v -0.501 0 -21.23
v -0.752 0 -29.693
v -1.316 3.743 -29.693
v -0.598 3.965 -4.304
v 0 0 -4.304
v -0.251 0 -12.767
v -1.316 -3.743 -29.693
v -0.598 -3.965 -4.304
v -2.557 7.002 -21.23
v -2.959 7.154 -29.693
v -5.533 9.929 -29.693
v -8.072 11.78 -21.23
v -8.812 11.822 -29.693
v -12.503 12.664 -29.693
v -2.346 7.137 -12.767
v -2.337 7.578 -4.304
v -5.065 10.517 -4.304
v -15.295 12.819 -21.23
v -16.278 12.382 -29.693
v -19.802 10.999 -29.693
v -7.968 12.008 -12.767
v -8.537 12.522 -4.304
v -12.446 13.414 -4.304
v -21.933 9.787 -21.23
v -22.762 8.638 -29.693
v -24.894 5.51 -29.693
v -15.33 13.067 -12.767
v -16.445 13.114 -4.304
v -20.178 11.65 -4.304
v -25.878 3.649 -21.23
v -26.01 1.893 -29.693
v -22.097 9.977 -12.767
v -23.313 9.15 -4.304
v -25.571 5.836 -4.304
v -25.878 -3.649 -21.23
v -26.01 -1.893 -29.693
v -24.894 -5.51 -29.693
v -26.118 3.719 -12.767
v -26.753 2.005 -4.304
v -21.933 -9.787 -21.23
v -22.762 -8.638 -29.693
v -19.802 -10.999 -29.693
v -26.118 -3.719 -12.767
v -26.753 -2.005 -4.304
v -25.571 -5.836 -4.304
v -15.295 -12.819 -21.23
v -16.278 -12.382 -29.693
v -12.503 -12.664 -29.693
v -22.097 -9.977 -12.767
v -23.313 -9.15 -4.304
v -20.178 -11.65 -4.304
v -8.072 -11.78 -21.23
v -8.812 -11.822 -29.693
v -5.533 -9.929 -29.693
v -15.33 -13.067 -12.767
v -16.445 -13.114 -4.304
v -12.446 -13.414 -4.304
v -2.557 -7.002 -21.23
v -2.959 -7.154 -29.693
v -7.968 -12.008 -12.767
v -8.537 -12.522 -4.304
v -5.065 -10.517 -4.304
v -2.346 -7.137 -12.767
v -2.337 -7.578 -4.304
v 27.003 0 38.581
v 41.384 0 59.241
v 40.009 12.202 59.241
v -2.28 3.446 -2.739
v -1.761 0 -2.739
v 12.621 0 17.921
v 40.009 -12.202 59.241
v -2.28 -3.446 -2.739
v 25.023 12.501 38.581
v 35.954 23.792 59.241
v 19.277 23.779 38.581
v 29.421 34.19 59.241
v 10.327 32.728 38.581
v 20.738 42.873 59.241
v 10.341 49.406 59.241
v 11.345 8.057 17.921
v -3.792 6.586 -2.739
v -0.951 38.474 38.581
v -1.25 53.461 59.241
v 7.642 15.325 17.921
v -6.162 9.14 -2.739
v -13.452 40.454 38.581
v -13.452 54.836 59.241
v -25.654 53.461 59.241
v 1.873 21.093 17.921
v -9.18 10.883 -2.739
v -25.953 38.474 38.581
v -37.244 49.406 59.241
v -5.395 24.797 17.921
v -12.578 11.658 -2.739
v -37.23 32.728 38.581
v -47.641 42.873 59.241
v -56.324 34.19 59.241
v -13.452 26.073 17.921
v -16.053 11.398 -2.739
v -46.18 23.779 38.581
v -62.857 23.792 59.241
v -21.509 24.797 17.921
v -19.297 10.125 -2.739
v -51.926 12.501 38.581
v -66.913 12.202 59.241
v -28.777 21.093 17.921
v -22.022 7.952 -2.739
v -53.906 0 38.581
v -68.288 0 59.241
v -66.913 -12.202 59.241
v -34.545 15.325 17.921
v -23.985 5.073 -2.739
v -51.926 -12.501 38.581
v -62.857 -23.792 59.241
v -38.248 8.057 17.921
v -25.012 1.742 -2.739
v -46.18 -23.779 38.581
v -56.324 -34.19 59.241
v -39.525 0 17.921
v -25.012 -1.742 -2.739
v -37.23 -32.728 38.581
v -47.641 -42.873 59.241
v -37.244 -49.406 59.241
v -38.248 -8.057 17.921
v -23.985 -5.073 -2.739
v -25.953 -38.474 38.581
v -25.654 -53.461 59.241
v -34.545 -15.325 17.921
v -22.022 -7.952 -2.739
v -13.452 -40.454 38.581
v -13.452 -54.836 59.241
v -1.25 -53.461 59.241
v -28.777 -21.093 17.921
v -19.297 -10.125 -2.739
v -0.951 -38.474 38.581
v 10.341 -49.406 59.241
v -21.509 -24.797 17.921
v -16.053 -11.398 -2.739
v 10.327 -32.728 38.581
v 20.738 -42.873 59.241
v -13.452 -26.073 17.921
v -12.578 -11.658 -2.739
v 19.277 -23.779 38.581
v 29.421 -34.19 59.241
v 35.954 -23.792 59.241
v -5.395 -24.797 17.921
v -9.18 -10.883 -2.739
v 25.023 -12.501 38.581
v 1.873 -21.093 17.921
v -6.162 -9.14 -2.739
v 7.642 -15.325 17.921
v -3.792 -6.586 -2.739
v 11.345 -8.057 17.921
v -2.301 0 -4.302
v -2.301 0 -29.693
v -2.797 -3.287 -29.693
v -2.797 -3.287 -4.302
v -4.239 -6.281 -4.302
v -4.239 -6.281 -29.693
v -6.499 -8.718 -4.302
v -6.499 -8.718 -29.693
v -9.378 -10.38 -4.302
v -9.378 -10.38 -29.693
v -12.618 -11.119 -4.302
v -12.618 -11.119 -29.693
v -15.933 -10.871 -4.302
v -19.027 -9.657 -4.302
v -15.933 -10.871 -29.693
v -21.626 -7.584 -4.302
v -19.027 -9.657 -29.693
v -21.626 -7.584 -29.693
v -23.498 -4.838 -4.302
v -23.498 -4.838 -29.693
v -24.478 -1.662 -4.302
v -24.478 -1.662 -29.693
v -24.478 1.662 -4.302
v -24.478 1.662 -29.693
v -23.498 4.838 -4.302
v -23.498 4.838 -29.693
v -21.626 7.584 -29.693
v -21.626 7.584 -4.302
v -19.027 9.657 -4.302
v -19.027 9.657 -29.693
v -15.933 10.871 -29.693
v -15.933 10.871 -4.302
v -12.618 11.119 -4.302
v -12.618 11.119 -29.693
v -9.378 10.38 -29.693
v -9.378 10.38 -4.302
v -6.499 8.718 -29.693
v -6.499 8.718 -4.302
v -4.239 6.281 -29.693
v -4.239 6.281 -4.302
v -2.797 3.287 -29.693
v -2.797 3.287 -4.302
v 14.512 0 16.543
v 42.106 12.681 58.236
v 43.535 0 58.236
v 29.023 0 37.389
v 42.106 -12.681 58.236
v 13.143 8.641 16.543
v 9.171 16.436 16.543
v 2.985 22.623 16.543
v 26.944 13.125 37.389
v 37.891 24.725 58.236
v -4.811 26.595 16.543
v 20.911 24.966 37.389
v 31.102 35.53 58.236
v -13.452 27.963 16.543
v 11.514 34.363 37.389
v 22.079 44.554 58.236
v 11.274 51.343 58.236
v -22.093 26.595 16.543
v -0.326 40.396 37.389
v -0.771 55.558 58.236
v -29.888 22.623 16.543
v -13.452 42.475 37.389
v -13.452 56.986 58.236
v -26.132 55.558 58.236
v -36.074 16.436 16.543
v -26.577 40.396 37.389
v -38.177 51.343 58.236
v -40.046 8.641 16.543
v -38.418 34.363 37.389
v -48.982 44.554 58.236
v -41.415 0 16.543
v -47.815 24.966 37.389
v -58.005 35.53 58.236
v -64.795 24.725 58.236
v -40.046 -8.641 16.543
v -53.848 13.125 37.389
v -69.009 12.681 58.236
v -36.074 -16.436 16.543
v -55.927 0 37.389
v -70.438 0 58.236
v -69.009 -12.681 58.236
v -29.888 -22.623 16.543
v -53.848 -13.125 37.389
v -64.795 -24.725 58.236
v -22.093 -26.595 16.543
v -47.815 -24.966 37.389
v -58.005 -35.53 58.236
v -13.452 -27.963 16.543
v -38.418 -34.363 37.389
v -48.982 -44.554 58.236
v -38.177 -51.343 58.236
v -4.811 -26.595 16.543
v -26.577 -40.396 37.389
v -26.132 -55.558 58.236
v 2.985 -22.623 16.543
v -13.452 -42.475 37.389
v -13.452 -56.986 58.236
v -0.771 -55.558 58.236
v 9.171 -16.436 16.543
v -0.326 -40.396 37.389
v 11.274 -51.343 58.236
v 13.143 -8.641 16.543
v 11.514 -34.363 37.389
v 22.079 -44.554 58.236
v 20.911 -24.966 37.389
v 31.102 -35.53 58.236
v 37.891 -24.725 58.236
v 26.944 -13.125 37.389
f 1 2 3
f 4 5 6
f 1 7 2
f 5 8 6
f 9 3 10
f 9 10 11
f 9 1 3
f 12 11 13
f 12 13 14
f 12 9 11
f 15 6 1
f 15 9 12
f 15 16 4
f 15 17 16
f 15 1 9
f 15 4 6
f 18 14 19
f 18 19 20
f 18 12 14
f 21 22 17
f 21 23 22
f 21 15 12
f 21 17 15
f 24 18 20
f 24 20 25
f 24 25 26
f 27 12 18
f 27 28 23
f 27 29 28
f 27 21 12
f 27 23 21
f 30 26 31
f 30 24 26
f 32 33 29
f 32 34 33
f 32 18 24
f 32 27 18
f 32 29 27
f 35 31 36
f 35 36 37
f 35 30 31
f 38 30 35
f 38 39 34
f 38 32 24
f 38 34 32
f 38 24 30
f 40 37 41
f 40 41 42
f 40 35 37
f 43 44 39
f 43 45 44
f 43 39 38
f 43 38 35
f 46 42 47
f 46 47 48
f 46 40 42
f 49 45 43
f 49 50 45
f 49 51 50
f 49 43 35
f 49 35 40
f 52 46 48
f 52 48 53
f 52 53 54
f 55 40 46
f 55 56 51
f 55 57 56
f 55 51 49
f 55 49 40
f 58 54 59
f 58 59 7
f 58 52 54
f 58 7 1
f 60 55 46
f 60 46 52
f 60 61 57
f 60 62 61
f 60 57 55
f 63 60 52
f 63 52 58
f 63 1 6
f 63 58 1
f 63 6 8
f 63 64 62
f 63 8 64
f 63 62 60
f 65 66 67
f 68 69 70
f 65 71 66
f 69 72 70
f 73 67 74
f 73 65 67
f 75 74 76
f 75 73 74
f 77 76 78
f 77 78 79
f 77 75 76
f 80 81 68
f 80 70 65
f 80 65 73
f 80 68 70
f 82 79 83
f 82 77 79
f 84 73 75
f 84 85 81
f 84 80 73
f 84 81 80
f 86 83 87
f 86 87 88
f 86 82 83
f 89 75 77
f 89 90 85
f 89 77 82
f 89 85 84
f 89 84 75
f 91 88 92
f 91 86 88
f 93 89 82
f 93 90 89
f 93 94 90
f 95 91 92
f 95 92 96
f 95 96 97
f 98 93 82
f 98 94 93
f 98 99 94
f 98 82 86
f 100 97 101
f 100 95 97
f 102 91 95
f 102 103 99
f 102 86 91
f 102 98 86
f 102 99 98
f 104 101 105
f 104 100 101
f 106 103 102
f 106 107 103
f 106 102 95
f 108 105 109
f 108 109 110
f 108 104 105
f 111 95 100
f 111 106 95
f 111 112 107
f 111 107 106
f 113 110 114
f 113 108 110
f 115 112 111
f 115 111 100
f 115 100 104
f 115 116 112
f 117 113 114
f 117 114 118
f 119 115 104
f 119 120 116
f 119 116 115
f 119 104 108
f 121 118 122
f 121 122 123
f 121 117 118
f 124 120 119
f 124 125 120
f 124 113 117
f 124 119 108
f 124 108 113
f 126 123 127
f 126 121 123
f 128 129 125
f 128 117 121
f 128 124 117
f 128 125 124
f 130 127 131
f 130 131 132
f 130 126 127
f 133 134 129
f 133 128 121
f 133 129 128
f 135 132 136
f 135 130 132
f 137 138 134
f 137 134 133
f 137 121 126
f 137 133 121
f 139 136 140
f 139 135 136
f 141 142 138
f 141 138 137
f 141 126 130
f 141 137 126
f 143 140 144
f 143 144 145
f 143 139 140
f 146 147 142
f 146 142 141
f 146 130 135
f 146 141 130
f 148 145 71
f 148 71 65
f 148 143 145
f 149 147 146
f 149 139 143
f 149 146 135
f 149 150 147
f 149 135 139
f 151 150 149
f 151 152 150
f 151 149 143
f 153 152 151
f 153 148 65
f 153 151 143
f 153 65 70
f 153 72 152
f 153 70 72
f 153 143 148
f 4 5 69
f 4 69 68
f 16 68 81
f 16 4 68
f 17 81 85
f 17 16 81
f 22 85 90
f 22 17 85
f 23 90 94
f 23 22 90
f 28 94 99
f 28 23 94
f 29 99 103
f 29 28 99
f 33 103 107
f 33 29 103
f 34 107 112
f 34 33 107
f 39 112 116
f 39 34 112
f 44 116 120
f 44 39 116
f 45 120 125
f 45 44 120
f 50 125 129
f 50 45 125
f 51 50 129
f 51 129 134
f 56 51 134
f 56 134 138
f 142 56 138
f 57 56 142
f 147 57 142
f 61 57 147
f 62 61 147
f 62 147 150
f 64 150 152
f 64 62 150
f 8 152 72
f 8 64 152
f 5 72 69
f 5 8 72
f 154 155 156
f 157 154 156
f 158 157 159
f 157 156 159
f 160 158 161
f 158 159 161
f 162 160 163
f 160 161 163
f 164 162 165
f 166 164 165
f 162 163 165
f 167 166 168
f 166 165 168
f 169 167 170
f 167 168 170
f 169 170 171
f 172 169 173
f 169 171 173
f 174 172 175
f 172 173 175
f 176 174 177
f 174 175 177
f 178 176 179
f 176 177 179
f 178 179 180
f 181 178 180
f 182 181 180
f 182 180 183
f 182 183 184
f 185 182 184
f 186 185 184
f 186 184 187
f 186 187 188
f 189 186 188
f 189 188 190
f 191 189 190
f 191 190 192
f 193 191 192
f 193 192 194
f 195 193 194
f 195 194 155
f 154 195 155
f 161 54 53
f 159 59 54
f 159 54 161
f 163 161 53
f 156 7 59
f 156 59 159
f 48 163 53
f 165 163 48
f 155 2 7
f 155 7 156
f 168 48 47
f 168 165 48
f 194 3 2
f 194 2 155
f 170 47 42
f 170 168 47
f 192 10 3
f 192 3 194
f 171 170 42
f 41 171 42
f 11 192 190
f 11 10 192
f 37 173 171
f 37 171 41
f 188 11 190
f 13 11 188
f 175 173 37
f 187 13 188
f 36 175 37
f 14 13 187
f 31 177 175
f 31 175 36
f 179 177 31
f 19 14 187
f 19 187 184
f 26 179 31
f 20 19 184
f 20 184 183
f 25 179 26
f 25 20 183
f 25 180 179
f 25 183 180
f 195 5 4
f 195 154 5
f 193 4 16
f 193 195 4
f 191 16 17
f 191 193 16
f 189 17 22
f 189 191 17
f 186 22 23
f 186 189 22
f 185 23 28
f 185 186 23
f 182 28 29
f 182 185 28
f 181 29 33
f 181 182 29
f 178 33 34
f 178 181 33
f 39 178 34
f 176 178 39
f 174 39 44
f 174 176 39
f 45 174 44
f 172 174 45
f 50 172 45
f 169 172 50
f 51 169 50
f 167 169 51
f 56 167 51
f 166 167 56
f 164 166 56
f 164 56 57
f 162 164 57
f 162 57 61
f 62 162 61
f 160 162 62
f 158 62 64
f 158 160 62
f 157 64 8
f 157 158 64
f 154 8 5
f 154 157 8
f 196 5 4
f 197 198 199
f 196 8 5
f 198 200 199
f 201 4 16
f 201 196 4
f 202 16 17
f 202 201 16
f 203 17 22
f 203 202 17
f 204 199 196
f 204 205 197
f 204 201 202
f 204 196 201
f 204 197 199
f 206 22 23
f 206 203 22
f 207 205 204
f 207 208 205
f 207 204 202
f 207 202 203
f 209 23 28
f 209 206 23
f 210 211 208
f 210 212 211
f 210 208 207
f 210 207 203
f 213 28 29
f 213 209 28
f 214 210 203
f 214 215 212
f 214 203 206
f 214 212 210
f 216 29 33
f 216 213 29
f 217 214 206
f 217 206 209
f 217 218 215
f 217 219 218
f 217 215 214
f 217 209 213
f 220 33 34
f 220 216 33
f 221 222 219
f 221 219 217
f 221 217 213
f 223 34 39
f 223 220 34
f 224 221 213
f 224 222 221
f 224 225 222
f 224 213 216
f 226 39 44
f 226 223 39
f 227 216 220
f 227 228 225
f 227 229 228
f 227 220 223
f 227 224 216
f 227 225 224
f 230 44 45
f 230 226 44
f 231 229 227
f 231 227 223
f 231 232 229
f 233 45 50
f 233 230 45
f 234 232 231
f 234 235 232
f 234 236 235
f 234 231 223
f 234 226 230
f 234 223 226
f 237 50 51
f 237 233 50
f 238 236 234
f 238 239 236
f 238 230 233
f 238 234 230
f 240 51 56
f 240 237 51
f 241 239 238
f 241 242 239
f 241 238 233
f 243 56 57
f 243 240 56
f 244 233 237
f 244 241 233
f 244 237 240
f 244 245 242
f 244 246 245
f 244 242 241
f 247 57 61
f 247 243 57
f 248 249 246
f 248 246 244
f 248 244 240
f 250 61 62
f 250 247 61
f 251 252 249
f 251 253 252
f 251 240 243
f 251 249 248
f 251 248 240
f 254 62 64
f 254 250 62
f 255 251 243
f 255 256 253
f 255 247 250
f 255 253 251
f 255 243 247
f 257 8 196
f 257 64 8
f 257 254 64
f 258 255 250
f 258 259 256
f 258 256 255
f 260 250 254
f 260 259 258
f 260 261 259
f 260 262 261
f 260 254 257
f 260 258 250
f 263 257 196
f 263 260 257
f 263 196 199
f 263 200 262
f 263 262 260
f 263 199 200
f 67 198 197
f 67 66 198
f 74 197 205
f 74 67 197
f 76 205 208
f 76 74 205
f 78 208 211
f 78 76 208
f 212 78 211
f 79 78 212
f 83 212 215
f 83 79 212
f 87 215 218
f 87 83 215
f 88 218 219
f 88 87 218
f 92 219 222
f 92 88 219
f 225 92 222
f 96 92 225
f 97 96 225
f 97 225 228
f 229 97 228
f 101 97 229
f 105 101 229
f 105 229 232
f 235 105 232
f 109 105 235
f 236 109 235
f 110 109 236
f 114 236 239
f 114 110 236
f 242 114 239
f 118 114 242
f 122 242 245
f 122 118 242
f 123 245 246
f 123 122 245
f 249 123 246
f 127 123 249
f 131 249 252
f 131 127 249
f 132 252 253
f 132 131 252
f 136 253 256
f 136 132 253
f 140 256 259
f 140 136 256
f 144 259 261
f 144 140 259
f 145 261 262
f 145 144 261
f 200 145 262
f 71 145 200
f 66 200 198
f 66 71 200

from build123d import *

# Parameters (mm, degrees)
F2_R     = 11.150634
F3_DEPTH = 25.4


with BuildPart() as f1:
    # F0 (on Front) → F1 (revolve)
    with BuildSketch(Plane.XZ):
        Polygon((-13.451746, -4.29259), (-13.451746, -29.69259), (-0.751746, -29.69259), (0, -4.303717), align=None)
        Polygon((-1.760611, -2.738729), (0, -4.303717), (43.534535, 58.235745), (41.384326, 59.241057), align=None)
    revolve(axis=Axis((-13.451746, 0, -16.99259), (0, 0, 1)))

    # F2 (on face) → F3 (cut)
    with BuildSketch(Plane(origin=(0, 0, -29.69259), x_dir=(1, 0, 0), z_dir=(0, 0, -1))):
        with Locations((-13.451746, 0)):
            Circle(F2_R)
    extrude(amount=-F3_DEPTH, mode=Mode.SUBTRACT)


solid = f1.part
